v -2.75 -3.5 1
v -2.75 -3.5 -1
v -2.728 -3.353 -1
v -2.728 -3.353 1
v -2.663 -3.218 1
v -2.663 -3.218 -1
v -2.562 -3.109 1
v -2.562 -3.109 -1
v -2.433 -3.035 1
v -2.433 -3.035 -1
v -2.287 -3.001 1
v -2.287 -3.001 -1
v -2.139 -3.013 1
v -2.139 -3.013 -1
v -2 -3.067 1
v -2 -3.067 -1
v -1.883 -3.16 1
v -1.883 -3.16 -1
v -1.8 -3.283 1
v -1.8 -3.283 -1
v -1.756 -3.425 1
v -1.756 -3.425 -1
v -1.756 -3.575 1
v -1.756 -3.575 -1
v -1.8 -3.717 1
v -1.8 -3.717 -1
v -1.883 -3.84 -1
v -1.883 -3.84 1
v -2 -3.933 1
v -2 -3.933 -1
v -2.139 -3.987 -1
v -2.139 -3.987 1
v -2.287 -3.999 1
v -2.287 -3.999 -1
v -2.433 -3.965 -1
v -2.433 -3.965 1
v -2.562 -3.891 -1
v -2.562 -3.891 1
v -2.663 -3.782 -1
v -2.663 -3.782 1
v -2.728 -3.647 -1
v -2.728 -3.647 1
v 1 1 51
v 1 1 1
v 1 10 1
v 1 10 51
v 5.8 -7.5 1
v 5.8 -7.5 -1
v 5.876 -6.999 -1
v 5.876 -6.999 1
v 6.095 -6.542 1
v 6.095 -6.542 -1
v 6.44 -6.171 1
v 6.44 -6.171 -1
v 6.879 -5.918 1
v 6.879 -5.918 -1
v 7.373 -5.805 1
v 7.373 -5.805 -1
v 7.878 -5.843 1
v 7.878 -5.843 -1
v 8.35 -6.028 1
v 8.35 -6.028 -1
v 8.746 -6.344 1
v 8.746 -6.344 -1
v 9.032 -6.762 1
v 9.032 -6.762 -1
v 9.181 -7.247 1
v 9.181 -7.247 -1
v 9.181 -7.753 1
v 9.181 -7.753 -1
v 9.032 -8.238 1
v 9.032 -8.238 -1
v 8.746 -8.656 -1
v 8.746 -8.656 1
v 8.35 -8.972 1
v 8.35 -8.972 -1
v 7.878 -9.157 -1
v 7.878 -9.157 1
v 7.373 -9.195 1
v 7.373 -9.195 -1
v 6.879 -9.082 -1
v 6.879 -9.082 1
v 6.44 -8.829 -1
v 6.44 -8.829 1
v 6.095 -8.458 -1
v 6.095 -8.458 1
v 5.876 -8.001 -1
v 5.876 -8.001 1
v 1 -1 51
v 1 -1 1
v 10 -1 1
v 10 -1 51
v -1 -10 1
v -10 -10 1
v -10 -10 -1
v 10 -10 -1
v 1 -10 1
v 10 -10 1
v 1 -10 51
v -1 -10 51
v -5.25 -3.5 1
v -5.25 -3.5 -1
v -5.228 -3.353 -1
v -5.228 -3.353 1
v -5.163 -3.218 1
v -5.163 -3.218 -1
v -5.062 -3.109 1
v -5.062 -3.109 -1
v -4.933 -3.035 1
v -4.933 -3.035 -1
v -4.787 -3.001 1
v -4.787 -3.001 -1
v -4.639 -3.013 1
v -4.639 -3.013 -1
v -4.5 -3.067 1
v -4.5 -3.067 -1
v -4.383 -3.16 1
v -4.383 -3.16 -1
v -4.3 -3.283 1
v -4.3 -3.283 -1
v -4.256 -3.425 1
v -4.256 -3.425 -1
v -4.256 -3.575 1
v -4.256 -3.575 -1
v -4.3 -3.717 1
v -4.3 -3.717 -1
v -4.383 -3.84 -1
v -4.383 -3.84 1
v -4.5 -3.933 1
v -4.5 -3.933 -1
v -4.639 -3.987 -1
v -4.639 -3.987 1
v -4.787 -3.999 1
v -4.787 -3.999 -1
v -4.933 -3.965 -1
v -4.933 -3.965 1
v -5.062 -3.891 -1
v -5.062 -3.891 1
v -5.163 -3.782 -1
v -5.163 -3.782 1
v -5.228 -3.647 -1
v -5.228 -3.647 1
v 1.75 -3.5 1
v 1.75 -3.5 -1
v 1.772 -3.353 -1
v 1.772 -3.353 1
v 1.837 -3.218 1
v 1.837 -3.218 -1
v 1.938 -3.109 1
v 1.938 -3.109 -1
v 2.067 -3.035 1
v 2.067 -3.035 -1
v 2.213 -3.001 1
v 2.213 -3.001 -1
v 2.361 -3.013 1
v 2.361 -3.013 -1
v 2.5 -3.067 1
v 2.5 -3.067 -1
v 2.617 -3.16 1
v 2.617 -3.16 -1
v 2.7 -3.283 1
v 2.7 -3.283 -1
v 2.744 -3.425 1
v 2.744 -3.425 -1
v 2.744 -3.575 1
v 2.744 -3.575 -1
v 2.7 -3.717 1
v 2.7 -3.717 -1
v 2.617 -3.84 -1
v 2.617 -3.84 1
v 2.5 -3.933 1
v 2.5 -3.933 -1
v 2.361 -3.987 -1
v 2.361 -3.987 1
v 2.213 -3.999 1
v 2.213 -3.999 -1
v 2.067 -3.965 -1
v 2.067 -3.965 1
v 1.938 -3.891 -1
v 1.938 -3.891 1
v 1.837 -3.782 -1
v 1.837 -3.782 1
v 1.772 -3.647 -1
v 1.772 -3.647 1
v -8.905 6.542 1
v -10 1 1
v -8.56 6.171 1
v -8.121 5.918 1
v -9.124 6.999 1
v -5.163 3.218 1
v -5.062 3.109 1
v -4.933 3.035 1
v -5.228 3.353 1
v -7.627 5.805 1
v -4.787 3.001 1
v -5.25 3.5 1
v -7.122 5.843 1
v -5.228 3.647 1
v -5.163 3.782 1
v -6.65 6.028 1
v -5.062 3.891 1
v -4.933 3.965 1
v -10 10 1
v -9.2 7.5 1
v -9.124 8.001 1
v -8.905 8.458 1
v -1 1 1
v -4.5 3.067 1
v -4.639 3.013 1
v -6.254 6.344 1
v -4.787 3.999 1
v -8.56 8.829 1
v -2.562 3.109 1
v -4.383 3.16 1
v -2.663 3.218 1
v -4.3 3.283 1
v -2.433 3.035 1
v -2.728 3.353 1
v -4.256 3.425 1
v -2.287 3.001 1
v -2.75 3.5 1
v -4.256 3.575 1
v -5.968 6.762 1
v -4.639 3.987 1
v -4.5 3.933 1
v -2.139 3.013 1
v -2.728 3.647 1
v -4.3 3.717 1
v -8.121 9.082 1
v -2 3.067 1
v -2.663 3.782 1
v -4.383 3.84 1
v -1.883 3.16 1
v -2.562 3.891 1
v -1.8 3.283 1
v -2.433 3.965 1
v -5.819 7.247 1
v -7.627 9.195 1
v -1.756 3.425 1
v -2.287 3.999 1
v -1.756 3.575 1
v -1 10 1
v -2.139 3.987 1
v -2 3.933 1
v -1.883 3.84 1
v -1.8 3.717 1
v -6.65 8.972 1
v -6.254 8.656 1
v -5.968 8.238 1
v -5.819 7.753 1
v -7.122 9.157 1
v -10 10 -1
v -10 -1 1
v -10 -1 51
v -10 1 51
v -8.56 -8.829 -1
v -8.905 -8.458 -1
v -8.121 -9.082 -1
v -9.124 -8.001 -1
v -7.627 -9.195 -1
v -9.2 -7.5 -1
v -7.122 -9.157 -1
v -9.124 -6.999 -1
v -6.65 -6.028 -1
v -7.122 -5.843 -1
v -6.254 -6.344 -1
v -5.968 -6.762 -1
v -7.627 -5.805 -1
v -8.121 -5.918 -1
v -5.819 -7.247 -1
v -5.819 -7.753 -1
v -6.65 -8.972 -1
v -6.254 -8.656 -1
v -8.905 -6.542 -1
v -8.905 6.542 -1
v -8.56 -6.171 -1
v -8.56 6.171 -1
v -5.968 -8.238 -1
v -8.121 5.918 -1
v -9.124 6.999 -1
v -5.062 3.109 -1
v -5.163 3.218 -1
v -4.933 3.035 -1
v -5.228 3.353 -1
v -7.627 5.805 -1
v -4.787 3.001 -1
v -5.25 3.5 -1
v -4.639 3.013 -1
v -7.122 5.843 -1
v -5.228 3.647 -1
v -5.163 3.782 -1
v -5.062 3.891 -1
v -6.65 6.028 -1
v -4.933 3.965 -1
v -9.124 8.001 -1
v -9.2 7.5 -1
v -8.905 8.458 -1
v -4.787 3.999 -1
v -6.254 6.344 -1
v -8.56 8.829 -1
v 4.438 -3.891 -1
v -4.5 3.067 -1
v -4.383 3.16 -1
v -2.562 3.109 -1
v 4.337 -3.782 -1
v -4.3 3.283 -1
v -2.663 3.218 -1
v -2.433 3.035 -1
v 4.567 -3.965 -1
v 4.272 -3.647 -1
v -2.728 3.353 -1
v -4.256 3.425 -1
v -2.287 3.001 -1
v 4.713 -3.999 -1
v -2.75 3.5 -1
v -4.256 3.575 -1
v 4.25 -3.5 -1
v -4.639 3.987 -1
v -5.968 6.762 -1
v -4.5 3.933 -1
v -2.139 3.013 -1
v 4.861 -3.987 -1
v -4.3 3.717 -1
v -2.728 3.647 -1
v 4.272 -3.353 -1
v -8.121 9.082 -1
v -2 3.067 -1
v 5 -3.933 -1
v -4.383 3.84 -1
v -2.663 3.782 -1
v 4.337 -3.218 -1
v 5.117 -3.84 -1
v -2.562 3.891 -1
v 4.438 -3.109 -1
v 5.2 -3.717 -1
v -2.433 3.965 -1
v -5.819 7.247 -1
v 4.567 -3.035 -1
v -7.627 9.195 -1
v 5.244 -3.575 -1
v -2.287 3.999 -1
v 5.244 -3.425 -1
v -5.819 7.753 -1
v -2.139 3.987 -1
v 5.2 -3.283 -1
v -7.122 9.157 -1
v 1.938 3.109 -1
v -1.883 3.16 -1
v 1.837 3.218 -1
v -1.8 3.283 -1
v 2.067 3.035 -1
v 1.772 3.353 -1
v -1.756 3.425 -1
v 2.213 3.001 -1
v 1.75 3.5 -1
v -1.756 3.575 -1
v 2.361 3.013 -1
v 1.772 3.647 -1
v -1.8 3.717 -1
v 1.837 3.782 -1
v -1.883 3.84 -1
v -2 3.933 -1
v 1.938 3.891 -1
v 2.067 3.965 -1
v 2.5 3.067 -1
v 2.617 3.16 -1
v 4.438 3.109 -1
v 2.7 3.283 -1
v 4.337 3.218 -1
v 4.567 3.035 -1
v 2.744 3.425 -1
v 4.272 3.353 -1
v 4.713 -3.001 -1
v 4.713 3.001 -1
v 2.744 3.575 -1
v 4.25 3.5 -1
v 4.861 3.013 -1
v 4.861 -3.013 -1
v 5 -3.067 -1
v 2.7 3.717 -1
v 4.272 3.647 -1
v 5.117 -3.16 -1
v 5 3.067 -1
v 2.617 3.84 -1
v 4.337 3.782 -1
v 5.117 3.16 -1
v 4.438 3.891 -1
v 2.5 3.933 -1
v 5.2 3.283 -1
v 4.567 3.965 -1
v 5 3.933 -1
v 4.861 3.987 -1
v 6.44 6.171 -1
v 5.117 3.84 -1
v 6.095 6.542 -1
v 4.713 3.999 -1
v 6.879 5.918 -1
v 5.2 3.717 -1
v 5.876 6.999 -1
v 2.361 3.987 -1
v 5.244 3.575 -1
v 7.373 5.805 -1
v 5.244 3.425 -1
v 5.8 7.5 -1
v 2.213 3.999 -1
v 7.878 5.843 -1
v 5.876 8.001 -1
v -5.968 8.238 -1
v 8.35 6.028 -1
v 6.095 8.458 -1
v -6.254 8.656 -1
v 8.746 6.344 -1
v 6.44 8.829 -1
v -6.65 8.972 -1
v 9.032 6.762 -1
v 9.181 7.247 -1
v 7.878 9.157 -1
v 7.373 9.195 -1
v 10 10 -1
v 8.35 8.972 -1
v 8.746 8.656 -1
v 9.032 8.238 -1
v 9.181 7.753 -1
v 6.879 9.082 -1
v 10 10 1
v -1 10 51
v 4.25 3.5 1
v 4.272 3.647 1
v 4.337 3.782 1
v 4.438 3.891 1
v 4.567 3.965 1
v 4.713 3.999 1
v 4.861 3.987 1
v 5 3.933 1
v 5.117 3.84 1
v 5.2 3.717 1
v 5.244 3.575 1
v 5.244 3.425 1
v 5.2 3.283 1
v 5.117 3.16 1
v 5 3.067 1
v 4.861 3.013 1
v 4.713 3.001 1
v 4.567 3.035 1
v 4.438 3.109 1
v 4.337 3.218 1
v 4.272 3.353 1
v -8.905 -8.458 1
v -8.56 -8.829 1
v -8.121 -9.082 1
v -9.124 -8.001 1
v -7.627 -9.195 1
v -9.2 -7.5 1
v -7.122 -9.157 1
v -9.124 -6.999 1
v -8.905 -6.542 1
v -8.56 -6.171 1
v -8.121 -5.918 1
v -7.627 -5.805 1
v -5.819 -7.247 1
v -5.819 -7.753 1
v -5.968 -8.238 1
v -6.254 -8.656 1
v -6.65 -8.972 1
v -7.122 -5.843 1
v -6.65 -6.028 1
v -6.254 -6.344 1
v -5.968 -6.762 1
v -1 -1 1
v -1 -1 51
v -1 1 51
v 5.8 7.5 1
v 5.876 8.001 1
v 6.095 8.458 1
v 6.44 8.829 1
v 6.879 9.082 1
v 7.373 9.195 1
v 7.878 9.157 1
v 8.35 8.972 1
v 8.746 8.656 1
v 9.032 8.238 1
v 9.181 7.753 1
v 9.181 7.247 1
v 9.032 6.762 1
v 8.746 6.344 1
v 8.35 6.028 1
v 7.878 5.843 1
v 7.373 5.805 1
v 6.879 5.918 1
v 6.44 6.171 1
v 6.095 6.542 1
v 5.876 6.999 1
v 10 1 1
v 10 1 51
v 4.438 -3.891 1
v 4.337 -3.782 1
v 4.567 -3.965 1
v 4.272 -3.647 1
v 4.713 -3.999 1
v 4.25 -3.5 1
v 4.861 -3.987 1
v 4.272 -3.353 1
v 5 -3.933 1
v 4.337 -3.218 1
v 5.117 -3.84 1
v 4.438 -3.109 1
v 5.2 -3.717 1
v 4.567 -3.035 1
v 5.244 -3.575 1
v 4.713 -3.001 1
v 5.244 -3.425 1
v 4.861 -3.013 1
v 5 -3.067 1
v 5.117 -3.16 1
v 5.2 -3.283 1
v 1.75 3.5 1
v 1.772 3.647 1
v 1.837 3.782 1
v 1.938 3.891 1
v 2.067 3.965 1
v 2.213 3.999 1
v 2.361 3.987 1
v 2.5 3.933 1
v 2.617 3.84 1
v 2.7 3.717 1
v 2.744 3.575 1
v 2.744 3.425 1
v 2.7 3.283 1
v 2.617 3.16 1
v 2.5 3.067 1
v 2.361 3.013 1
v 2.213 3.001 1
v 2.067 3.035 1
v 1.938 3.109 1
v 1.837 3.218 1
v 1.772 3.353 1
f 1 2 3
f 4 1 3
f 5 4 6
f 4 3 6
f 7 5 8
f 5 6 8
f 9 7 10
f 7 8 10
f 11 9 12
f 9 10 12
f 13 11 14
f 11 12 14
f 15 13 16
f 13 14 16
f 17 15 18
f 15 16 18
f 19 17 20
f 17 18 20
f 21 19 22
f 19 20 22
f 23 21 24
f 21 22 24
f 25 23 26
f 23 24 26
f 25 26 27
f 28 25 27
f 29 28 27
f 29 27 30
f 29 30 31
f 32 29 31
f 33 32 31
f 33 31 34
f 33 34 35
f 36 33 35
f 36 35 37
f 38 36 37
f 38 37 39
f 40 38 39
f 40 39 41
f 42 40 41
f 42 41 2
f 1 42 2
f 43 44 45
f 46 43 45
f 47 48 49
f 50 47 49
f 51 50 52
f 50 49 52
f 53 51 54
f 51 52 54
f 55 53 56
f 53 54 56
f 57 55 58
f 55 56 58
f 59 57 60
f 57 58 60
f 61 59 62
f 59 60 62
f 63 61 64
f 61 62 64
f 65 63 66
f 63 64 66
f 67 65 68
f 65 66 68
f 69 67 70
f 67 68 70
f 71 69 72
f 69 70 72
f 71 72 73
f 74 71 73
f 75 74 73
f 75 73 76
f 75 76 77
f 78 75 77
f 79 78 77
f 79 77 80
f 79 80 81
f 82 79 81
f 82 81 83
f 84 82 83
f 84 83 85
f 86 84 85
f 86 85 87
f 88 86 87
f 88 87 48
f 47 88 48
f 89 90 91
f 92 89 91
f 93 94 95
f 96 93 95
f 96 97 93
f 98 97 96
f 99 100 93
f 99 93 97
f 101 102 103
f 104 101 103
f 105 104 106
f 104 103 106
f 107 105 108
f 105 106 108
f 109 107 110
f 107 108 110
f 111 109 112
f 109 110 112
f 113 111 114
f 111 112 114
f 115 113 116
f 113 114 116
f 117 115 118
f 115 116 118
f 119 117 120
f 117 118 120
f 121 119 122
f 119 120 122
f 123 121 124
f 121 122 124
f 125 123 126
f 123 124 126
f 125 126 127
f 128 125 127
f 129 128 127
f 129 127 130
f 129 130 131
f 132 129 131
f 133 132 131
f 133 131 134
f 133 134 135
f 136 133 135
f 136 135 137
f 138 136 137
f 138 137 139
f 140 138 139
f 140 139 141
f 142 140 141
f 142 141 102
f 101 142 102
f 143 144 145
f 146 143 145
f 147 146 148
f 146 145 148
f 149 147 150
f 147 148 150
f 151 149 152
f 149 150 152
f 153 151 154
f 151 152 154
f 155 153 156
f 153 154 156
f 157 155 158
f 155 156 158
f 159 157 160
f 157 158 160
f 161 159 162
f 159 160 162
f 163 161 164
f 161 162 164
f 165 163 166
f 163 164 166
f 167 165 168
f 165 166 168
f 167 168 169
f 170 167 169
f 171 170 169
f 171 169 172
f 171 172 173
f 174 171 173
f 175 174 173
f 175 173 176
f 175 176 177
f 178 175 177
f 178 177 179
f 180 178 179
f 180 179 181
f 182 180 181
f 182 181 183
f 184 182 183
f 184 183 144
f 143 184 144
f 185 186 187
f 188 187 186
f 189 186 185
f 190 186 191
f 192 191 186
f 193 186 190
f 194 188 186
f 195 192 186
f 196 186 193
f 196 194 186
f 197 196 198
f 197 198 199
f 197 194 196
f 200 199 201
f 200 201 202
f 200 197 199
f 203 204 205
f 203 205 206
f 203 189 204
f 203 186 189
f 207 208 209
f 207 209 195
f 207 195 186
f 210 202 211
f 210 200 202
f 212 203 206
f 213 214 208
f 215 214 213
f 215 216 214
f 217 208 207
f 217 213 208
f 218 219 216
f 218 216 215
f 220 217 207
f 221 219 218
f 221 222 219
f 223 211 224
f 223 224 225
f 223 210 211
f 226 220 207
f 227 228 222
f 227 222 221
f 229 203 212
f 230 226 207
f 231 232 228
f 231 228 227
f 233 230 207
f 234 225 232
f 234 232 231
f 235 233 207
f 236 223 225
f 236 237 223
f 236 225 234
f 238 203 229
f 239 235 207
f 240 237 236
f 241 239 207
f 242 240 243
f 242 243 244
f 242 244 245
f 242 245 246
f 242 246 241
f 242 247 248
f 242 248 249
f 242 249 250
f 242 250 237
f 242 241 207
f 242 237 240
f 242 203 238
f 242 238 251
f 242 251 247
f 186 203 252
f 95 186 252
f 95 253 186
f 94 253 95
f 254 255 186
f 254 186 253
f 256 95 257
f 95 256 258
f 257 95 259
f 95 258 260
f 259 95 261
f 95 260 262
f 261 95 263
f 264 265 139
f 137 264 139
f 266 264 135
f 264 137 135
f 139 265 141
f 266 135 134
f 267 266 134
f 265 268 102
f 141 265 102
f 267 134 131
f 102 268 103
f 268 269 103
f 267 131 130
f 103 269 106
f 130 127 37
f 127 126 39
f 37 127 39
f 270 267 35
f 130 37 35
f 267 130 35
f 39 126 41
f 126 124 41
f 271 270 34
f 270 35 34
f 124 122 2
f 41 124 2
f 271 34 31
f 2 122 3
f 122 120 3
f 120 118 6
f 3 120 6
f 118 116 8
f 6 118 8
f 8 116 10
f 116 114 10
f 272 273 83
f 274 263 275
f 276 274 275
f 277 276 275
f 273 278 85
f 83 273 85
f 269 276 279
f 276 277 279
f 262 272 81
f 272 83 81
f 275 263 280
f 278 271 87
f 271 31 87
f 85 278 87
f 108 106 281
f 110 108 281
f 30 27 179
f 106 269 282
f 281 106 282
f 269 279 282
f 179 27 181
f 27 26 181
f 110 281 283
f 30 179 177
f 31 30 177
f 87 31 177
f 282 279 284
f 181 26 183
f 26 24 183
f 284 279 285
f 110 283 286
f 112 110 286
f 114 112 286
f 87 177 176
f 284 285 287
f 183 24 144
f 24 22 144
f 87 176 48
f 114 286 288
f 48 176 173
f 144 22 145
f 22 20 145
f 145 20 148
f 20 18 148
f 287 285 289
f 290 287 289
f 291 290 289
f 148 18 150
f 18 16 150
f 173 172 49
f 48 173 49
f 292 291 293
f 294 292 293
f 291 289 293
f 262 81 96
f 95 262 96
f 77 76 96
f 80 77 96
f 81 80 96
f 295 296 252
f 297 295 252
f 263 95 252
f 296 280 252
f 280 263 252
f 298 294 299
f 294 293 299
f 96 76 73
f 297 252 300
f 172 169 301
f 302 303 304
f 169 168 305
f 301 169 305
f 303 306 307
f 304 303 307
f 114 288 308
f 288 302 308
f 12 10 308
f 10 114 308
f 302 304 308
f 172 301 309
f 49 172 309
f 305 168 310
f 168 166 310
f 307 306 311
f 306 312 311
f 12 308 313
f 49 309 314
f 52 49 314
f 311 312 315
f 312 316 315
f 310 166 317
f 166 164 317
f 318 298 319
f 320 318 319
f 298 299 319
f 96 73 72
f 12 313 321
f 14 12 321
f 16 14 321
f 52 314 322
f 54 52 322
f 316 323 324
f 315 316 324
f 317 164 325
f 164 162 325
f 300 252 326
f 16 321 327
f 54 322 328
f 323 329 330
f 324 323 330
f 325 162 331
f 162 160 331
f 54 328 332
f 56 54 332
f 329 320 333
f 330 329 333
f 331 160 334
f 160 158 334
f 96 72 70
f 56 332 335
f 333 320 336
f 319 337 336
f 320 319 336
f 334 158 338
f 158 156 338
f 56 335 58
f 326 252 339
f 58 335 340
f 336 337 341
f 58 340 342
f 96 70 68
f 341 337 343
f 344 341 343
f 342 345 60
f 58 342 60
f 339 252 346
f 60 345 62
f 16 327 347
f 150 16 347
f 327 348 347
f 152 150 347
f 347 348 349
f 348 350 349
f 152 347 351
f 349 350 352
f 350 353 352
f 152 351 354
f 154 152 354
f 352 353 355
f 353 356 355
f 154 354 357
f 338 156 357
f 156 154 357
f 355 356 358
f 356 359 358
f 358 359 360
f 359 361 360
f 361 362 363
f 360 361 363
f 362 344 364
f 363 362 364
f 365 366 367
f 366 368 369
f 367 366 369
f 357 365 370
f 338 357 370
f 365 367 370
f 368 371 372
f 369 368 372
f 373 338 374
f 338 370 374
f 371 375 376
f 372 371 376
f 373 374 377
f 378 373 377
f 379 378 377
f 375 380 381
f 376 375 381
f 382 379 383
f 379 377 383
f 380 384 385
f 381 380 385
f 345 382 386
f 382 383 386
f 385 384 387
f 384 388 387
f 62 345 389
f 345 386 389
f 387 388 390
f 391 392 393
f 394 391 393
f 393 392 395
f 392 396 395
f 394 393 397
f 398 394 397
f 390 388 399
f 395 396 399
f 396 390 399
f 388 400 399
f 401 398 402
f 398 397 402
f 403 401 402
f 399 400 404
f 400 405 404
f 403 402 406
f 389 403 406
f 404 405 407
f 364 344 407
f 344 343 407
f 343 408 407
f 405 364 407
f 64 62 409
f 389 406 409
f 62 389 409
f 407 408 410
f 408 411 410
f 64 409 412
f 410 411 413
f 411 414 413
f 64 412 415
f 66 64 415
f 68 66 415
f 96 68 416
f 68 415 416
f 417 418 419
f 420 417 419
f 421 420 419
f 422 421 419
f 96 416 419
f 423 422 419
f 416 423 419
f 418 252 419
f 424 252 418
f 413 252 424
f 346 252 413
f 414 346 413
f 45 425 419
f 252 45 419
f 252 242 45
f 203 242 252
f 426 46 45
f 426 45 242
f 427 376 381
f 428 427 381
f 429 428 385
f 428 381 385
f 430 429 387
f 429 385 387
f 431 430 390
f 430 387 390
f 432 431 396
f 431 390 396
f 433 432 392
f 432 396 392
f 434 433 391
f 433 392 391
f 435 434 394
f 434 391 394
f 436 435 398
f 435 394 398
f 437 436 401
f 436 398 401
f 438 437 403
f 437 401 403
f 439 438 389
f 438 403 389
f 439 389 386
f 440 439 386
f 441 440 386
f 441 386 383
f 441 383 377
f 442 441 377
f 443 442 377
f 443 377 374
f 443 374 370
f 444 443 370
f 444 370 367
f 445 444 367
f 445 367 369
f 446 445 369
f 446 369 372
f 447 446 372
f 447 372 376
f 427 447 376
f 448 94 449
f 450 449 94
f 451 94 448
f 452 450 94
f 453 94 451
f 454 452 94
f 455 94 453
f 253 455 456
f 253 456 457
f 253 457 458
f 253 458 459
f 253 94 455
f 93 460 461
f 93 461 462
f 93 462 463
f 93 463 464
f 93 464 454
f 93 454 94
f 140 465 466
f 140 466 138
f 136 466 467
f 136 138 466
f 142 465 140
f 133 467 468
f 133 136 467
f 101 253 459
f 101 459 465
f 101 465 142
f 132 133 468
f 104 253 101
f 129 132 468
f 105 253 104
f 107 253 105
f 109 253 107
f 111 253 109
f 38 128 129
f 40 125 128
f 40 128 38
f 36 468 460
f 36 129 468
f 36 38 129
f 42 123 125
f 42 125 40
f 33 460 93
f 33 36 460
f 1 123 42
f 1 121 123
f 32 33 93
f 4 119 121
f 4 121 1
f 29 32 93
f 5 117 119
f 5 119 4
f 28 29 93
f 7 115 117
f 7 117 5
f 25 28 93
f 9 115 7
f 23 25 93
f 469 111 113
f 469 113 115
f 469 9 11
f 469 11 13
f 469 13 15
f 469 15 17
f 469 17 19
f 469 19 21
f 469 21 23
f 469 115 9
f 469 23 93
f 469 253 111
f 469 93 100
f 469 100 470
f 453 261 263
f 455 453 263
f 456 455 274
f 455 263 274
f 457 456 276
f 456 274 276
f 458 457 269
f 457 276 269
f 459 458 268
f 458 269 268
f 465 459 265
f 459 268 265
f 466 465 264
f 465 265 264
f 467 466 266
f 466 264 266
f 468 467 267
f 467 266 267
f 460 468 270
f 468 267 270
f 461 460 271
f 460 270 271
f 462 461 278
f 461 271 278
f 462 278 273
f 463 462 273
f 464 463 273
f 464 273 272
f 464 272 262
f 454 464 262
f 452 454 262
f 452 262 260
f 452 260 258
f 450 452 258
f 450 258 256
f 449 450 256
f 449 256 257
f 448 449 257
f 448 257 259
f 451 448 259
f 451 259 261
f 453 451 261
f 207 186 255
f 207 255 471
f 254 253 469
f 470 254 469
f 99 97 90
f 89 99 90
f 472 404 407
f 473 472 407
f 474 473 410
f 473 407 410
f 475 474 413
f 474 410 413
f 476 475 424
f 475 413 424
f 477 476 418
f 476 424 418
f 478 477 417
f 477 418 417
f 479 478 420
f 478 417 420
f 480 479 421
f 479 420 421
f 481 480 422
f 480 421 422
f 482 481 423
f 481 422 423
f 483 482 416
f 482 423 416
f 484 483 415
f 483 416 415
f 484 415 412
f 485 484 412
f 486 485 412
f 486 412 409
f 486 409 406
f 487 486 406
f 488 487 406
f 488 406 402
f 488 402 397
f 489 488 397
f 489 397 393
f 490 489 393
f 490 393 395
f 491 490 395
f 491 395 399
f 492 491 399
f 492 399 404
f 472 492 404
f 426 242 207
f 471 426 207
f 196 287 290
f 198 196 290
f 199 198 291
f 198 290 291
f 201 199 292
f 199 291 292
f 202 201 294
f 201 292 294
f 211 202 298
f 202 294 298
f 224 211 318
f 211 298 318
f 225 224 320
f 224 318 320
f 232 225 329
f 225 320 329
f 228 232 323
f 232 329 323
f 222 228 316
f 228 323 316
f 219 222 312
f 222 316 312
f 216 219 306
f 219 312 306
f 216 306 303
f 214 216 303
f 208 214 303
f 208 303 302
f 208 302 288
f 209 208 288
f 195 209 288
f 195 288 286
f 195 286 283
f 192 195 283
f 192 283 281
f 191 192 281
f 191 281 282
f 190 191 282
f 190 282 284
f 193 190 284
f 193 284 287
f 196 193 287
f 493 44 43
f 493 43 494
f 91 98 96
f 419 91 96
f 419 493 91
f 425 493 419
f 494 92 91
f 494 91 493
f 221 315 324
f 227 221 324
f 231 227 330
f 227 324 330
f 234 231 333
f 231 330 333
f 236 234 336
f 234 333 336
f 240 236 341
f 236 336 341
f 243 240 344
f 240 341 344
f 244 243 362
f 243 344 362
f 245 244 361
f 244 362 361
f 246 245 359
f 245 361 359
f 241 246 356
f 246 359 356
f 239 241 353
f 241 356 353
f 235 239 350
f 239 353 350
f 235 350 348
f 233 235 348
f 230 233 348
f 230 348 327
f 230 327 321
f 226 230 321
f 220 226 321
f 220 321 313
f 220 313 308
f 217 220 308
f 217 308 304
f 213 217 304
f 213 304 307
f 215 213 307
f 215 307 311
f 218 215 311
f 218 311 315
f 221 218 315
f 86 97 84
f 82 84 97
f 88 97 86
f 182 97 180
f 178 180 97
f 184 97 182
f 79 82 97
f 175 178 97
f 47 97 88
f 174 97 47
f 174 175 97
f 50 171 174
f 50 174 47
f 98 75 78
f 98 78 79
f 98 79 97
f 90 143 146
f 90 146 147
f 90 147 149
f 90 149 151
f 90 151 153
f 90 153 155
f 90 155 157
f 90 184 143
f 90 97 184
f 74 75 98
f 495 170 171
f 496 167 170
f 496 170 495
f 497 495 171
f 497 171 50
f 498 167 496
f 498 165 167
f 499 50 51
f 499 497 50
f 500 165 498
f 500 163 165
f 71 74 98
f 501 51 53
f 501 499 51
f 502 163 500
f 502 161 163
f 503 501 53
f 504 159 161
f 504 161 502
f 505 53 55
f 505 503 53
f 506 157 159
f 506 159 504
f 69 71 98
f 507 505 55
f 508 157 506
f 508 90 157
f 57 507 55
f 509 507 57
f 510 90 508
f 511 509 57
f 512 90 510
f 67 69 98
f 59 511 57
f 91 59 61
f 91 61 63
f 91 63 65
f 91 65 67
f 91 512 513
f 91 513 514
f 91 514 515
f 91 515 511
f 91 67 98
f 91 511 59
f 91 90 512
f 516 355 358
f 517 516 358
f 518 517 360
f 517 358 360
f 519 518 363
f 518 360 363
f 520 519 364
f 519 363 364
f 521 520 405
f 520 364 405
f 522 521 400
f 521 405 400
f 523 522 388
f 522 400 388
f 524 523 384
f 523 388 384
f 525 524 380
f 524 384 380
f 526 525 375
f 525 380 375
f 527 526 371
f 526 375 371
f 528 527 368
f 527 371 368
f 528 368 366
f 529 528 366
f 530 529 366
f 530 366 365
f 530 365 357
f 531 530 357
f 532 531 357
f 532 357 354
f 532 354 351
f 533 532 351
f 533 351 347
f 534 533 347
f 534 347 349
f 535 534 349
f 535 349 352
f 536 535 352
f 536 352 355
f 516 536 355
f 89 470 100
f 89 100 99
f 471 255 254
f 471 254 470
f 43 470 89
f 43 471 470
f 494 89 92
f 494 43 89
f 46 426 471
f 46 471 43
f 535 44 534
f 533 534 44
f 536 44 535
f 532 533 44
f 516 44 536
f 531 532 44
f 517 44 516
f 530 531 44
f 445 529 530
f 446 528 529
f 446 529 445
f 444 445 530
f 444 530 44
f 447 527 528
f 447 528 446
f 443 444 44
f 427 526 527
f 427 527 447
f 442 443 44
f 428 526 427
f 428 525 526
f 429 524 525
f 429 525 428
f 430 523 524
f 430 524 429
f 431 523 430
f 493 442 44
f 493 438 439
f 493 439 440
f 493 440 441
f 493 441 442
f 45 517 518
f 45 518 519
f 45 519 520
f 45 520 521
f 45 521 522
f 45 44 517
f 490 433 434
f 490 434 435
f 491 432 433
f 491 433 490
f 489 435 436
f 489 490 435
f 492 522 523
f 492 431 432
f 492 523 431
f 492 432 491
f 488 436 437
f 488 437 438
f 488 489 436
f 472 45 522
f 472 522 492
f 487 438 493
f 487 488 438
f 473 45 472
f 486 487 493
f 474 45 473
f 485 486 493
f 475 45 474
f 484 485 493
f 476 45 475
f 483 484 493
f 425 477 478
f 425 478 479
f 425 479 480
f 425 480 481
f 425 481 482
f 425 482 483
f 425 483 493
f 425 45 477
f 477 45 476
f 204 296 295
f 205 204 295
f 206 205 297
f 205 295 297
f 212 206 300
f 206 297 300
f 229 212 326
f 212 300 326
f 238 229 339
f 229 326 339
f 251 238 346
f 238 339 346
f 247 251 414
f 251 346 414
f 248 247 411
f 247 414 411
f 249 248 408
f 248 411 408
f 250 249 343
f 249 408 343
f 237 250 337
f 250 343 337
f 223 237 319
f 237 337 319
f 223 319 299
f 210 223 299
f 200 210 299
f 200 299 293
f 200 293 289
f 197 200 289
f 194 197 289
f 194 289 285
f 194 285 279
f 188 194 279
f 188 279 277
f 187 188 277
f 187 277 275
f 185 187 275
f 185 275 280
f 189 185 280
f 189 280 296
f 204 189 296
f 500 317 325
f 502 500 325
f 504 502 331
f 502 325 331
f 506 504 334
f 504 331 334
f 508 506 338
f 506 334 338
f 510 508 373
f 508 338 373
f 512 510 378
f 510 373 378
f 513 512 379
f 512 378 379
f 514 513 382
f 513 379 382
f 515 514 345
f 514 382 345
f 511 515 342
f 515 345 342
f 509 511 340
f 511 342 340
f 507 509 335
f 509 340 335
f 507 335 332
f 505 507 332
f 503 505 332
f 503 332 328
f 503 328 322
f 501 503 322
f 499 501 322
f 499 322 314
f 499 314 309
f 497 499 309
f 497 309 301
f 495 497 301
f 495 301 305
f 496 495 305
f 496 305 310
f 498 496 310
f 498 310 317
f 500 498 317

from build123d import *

# Parameters (mm, degrees)
F1_DEPTH = 1
F3_D     = 1
F4_W     = 2
F4_H     = 9
F4_H_2   = 2
F4_W_2   = 9
F5_DEPTH = 50
F6_D     = 3.4


# Not quite as in the source:
# - a feature names something its author has since deleted; it is built from what else it names


with BuildPart() as f1:
    # F0 (on Top) → F1 (new body, symmetric)
    with BuildSketch(Plane.XY):
        Polygon((10, 1), (10, 10), (1, 10), (-1, 10), (-10, 10), (-10, 1), (-10, -1), (-10, -10), (-1, -10), (1, -10), (10, -10), (10, -1), align=None)
    extrude(amount=F1_DEPTH, both=True)

    # F3 (through all)
    with Locations(Plane.XY.offset(1)):
        with Locations((-4.75, 3.5), (-2.25, 3.5), (-4.75, -3.5), (-2.25, -3.5), (2.25, 3.5), (4.75, 3.5), (4.75, -3.5), (2.25, -3.5)):
            Hole(F3_D / 2)

    # F4 (on face) → F5 (join)
    with BuildSketch(Plane.XY.offset(1)):
        with Locations((0, 5.5)):
            Rectangle(F4_W, F4_H)
        Rectangle(F4_W, F4_H_2)
        with Locations((-5.5, 0)):
            Rectangle(F4_W_2, F4_H_2)
        with Locations((5.5, 0)):
            Rectangle(F4_W_2, F4_H_2)
        with Locations((0, -5.5)):
            Rectangle(F4_W, F4_H)
    extrude(amount=F5_DEPTH)

    # F6 (through all)
    with Locations(Plane.XY.offset(1)):
        with Locations((-7.5, 7.5), (7.5, 7.5), (7.5, -7.5), (-7.5, -7.5)):
            Hole(F6_D / 2)


solid = f1.part
